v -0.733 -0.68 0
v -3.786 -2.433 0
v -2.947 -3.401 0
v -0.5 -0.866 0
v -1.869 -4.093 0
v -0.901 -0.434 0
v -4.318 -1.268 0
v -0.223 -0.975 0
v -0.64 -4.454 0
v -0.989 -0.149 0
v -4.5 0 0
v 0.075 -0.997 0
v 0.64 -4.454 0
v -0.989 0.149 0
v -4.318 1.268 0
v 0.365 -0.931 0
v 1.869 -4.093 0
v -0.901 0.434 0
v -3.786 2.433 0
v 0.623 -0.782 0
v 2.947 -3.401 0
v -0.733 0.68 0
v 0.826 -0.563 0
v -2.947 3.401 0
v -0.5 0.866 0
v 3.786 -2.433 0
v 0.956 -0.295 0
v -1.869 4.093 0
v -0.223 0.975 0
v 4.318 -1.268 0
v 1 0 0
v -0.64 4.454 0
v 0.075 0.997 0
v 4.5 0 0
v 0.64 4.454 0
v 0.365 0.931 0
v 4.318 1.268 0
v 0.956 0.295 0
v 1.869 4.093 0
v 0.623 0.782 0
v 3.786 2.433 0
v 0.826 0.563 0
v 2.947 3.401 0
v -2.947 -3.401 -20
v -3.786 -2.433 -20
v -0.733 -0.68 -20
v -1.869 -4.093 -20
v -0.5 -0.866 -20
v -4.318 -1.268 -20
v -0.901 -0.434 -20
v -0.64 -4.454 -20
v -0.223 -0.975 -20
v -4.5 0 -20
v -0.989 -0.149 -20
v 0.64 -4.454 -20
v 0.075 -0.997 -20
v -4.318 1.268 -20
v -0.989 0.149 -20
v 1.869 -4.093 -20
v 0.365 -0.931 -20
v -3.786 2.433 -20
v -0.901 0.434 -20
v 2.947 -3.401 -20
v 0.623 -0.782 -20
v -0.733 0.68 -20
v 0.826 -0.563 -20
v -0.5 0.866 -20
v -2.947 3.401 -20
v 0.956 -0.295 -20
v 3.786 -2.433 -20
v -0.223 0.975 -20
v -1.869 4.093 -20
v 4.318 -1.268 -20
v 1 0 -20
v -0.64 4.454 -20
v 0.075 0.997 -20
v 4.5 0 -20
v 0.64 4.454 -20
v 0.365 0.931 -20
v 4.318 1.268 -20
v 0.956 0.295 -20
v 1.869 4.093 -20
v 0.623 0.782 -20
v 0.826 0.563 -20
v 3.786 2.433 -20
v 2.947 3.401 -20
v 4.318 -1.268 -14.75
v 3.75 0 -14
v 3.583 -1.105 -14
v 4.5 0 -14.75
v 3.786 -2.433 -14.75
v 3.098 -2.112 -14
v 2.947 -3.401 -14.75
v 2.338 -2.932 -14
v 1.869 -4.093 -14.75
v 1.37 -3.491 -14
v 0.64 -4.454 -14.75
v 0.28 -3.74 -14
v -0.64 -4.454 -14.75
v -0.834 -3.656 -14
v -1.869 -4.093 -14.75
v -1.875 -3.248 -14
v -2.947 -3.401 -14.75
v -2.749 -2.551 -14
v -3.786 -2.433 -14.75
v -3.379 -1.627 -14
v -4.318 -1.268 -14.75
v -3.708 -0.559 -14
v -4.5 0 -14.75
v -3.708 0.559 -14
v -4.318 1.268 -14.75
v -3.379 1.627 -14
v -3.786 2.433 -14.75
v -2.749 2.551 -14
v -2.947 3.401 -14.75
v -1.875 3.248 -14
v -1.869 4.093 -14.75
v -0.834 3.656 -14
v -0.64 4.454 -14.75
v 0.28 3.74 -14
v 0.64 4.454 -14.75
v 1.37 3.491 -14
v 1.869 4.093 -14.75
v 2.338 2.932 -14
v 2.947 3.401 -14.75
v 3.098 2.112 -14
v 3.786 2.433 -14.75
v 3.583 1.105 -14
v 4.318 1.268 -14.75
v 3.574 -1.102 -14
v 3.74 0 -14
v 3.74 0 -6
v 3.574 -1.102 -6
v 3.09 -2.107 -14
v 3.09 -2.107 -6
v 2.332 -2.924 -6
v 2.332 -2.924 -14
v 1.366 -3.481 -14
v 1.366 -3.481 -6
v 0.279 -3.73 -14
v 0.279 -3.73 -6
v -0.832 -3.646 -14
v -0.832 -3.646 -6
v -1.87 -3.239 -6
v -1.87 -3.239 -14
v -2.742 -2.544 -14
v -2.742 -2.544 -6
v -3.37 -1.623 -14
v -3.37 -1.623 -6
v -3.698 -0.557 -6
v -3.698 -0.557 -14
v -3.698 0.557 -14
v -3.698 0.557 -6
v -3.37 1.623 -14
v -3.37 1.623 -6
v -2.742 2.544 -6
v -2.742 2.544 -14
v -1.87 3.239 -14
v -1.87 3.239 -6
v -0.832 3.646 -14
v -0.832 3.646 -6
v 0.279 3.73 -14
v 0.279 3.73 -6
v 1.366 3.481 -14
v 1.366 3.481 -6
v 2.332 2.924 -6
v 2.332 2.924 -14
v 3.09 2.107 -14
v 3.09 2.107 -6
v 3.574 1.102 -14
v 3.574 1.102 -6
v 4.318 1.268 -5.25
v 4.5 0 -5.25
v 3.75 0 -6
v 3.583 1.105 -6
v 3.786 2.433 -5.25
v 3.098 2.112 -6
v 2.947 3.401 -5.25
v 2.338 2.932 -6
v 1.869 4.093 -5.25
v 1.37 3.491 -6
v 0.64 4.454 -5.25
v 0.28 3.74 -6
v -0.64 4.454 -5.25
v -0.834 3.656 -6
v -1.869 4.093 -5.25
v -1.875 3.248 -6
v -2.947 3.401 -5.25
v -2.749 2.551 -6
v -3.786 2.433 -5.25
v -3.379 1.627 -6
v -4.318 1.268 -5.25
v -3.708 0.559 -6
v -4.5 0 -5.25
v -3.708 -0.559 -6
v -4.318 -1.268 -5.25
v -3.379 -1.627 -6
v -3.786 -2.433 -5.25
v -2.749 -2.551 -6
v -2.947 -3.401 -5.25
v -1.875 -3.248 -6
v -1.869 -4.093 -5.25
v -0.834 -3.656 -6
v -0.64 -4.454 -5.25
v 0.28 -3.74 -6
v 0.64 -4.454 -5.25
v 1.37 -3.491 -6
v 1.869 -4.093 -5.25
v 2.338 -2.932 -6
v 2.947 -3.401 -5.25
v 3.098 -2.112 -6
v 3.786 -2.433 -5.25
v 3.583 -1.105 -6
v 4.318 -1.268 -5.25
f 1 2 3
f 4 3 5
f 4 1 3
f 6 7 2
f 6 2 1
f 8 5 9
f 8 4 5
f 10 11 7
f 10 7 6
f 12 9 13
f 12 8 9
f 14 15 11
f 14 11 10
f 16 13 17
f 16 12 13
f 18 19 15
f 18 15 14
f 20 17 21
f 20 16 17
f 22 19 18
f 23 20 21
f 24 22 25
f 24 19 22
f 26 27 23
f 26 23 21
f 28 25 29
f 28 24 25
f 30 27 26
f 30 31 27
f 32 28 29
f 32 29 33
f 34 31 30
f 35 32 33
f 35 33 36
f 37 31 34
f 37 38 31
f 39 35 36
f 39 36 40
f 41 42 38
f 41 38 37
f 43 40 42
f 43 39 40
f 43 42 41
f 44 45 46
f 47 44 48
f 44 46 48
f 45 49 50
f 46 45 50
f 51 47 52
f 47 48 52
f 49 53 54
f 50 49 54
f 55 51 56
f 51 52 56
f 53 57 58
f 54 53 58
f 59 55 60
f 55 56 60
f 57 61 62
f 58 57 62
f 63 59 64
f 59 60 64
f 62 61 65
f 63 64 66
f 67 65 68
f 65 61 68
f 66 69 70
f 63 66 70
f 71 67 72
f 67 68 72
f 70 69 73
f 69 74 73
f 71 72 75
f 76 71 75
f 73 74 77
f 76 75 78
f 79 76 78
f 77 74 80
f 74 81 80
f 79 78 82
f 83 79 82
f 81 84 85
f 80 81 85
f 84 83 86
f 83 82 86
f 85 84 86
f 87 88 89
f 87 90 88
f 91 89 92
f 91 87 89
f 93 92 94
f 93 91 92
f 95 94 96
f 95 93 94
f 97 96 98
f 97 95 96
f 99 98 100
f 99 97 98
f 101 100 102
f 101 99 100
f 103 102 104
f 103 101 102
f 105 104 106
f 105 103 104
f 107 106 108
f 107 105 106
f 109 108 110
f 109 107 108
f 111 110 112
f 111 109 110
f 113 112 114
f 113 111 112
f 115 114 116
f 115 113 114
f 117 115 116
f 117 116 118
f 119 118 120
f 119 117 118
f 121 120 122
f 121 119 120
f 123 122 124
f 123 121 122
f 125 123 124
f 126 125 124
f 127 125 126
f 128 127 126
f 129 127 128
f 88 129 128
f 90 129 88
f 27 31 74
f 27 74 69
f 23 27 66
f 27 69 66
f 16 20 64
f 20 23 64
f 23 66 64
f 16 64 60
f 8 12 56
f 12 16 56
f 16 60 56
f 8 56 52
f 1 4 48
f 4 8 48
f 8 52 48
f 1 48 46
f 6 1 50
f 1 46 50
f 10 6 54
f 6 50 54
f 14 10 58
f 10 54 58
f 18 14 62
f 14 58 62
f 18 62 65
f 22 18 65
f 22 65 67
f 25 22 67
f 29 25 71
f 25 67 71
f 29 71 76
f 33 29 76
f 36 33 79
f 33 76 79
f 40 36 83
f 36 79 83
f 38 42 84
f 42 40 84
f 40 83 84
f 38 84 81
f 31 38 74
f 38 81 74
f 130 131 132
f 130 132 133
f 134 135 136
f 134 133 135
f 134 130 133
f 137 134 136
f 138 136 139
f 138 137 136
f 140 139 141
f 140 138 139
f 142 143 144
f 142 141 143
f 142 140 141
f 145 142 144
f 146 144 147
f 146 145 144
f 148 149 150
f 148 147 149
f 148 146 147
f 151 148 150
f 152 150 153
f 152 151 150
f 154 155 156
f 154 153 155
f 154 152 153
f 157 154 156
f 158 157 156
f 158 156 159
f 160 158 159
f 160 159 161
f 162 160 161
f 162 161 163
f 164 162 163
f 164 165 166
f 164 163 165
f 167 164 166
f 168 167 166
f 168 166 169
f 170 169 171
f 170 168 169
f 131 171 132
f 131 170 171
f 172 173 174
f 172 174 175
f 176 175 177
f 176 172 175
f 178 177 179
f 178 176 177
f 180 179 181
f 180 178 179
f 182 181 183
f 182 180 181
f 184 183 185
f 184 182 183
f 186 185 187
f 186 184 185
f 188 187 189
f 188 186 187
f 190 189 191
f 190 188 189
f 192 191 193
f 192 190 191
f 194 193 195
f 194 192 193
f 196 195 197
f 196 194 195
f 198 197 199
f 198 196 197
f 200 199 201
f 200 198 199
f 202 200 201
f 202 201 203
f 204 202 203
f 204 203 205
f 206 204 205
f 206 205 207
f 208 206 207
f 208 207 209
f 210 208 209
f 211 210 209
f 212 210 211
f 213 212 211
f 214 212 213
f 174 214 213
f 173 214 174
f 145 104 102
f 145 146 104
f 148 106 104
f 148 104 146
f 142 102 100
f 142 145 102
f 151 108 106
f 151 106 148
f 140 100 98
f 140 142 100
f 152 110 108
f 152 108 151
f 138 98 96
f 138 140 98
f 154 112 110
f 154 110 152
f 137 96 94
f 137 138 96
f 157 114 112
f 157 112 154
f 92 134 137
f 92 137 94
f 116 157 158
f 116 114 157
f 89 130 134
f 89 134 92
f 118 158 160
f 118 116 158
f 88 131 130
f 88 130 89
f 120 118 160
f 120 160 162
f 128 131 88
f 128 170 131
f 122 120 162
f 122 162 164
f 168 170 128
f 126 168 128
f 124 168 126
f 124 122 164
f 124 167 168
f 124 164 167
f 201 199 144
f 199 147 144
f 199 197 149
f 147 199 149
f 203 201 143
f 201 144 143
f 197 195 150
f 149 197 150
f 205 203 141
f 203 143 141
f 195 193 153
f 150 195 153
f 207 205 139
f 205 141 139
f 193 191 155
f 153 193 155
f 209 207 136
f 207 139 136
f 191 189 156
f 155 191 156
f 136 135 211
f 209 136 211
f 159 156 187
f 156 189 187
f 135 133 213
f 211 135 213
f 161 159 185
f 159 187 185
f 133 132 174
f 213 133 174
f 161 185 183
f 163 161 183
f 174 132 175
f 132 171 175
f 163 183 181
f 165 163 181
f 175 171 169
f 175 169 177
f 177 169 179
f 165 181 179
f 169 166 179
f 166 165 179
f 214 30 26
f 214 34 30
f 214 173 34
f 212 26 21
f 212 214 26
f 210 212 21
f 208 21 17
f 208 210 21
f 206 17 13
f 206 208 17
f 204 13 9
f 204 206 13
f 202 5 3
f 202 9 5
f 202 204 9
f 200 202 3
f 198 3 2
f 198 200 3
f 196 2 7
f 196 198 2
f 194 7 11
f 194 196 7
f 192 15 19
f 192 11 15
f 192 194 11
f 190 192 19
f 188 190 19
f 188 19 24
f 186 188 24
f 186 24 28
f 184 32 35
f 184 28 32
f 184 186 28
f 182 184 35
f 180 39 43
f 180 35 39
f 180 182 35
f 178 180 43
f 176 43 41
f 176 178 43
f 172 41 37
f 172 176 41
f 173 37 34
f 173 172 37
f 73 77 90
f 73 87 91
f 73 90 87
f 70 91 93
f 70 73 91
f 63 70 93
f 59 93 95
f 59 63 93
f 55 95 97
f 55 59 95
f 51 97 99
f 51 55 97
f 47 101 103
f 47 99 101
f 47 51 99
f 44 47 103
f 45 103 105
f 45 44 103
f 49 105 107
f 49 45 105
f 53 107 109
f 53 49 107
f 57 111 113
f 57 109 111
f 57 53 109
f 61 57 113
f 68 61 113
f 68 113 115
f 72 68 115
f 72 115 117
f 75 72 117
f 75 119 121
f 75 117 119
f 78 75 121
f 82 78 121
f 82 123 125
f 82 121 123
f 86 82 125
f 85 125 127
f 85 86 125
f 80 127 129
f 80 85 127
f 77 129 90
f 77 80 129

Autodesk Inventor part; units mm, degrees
ref_plane "YZ Plane" through (0, 0, 0) normal (1, 0, 0) x (0, 1, 0)
ref_plane "XZ Plane" through (0, 0, 0) normal (0, 1, 0) x (-1, 0, 0)
ref_plane "XY Plane" through (0, 0, 0) normal (0, 0, 1) x (1, 0, 0)
sketch "Sketch2" plane through (0, 0, 0) normal (0, 1, 0) x (-1, 0, 0)
  line L0 (0, 0) -> (-4.5, 0)
  line L1 (-4.5, 0) -> (-4.5, -6)
  line L2 (-4.5, -6) -> (0, -6)
  line L3 (0, -6) -> (0, 0)
  line L4 (0, -6) -> (-3.74, -6)
  line L5 (-3.74, -6) -> (-3.74, -14)
  line L6 (-3.74, -14) -> (0, -14)
  line L7 (0, -14) -> (0, -6)
  line L8 (0, -14) -> (-4.5, -14)
  line L9 (-4.5, -14) -> (-4.5, -20)
  line L10 (-4.5, -20) -> (0, -20)
  line L11 (0, -20) -> (0, -14)
  line L12 (0, 0) -> (-1, 0)
  line L13 (-1, 0) -> (-1, -20)
  line L14 (-1, -20) -> (0, -20)
  line L15 (0, -20) -> (0, 0)
  dimension "d0" = 1
  dimension "d1" = 6
  dimension "d2" = 4.5
  dimension "d3" = 20
  dimension "d4" = 6
  dimension "d6" = 4.5
revolve "Revolution1" add sketch "Sketch2" angle 360 about axis through (0, 0, -20) along (0, 0, 1)
revolve "Revolution2" cut sketch "Sketch2" angle 360 about axis through (0, 0, -6) along (0, 0, 1) contours L3 L2 L13 L0 | L7 L6 L13 L2 | L11 L10 L13 L6
chamfer "Chamfer1" distance 0.75 angle 45 2 edges at (-4.5, 0, -14) (-4.5, 0, -6)
equation "\"d4\" = d1"
equation "\"d6\" = d2"
properties part number "ShaftCoupler" material "Brass, Soft Yellow, Welded"
